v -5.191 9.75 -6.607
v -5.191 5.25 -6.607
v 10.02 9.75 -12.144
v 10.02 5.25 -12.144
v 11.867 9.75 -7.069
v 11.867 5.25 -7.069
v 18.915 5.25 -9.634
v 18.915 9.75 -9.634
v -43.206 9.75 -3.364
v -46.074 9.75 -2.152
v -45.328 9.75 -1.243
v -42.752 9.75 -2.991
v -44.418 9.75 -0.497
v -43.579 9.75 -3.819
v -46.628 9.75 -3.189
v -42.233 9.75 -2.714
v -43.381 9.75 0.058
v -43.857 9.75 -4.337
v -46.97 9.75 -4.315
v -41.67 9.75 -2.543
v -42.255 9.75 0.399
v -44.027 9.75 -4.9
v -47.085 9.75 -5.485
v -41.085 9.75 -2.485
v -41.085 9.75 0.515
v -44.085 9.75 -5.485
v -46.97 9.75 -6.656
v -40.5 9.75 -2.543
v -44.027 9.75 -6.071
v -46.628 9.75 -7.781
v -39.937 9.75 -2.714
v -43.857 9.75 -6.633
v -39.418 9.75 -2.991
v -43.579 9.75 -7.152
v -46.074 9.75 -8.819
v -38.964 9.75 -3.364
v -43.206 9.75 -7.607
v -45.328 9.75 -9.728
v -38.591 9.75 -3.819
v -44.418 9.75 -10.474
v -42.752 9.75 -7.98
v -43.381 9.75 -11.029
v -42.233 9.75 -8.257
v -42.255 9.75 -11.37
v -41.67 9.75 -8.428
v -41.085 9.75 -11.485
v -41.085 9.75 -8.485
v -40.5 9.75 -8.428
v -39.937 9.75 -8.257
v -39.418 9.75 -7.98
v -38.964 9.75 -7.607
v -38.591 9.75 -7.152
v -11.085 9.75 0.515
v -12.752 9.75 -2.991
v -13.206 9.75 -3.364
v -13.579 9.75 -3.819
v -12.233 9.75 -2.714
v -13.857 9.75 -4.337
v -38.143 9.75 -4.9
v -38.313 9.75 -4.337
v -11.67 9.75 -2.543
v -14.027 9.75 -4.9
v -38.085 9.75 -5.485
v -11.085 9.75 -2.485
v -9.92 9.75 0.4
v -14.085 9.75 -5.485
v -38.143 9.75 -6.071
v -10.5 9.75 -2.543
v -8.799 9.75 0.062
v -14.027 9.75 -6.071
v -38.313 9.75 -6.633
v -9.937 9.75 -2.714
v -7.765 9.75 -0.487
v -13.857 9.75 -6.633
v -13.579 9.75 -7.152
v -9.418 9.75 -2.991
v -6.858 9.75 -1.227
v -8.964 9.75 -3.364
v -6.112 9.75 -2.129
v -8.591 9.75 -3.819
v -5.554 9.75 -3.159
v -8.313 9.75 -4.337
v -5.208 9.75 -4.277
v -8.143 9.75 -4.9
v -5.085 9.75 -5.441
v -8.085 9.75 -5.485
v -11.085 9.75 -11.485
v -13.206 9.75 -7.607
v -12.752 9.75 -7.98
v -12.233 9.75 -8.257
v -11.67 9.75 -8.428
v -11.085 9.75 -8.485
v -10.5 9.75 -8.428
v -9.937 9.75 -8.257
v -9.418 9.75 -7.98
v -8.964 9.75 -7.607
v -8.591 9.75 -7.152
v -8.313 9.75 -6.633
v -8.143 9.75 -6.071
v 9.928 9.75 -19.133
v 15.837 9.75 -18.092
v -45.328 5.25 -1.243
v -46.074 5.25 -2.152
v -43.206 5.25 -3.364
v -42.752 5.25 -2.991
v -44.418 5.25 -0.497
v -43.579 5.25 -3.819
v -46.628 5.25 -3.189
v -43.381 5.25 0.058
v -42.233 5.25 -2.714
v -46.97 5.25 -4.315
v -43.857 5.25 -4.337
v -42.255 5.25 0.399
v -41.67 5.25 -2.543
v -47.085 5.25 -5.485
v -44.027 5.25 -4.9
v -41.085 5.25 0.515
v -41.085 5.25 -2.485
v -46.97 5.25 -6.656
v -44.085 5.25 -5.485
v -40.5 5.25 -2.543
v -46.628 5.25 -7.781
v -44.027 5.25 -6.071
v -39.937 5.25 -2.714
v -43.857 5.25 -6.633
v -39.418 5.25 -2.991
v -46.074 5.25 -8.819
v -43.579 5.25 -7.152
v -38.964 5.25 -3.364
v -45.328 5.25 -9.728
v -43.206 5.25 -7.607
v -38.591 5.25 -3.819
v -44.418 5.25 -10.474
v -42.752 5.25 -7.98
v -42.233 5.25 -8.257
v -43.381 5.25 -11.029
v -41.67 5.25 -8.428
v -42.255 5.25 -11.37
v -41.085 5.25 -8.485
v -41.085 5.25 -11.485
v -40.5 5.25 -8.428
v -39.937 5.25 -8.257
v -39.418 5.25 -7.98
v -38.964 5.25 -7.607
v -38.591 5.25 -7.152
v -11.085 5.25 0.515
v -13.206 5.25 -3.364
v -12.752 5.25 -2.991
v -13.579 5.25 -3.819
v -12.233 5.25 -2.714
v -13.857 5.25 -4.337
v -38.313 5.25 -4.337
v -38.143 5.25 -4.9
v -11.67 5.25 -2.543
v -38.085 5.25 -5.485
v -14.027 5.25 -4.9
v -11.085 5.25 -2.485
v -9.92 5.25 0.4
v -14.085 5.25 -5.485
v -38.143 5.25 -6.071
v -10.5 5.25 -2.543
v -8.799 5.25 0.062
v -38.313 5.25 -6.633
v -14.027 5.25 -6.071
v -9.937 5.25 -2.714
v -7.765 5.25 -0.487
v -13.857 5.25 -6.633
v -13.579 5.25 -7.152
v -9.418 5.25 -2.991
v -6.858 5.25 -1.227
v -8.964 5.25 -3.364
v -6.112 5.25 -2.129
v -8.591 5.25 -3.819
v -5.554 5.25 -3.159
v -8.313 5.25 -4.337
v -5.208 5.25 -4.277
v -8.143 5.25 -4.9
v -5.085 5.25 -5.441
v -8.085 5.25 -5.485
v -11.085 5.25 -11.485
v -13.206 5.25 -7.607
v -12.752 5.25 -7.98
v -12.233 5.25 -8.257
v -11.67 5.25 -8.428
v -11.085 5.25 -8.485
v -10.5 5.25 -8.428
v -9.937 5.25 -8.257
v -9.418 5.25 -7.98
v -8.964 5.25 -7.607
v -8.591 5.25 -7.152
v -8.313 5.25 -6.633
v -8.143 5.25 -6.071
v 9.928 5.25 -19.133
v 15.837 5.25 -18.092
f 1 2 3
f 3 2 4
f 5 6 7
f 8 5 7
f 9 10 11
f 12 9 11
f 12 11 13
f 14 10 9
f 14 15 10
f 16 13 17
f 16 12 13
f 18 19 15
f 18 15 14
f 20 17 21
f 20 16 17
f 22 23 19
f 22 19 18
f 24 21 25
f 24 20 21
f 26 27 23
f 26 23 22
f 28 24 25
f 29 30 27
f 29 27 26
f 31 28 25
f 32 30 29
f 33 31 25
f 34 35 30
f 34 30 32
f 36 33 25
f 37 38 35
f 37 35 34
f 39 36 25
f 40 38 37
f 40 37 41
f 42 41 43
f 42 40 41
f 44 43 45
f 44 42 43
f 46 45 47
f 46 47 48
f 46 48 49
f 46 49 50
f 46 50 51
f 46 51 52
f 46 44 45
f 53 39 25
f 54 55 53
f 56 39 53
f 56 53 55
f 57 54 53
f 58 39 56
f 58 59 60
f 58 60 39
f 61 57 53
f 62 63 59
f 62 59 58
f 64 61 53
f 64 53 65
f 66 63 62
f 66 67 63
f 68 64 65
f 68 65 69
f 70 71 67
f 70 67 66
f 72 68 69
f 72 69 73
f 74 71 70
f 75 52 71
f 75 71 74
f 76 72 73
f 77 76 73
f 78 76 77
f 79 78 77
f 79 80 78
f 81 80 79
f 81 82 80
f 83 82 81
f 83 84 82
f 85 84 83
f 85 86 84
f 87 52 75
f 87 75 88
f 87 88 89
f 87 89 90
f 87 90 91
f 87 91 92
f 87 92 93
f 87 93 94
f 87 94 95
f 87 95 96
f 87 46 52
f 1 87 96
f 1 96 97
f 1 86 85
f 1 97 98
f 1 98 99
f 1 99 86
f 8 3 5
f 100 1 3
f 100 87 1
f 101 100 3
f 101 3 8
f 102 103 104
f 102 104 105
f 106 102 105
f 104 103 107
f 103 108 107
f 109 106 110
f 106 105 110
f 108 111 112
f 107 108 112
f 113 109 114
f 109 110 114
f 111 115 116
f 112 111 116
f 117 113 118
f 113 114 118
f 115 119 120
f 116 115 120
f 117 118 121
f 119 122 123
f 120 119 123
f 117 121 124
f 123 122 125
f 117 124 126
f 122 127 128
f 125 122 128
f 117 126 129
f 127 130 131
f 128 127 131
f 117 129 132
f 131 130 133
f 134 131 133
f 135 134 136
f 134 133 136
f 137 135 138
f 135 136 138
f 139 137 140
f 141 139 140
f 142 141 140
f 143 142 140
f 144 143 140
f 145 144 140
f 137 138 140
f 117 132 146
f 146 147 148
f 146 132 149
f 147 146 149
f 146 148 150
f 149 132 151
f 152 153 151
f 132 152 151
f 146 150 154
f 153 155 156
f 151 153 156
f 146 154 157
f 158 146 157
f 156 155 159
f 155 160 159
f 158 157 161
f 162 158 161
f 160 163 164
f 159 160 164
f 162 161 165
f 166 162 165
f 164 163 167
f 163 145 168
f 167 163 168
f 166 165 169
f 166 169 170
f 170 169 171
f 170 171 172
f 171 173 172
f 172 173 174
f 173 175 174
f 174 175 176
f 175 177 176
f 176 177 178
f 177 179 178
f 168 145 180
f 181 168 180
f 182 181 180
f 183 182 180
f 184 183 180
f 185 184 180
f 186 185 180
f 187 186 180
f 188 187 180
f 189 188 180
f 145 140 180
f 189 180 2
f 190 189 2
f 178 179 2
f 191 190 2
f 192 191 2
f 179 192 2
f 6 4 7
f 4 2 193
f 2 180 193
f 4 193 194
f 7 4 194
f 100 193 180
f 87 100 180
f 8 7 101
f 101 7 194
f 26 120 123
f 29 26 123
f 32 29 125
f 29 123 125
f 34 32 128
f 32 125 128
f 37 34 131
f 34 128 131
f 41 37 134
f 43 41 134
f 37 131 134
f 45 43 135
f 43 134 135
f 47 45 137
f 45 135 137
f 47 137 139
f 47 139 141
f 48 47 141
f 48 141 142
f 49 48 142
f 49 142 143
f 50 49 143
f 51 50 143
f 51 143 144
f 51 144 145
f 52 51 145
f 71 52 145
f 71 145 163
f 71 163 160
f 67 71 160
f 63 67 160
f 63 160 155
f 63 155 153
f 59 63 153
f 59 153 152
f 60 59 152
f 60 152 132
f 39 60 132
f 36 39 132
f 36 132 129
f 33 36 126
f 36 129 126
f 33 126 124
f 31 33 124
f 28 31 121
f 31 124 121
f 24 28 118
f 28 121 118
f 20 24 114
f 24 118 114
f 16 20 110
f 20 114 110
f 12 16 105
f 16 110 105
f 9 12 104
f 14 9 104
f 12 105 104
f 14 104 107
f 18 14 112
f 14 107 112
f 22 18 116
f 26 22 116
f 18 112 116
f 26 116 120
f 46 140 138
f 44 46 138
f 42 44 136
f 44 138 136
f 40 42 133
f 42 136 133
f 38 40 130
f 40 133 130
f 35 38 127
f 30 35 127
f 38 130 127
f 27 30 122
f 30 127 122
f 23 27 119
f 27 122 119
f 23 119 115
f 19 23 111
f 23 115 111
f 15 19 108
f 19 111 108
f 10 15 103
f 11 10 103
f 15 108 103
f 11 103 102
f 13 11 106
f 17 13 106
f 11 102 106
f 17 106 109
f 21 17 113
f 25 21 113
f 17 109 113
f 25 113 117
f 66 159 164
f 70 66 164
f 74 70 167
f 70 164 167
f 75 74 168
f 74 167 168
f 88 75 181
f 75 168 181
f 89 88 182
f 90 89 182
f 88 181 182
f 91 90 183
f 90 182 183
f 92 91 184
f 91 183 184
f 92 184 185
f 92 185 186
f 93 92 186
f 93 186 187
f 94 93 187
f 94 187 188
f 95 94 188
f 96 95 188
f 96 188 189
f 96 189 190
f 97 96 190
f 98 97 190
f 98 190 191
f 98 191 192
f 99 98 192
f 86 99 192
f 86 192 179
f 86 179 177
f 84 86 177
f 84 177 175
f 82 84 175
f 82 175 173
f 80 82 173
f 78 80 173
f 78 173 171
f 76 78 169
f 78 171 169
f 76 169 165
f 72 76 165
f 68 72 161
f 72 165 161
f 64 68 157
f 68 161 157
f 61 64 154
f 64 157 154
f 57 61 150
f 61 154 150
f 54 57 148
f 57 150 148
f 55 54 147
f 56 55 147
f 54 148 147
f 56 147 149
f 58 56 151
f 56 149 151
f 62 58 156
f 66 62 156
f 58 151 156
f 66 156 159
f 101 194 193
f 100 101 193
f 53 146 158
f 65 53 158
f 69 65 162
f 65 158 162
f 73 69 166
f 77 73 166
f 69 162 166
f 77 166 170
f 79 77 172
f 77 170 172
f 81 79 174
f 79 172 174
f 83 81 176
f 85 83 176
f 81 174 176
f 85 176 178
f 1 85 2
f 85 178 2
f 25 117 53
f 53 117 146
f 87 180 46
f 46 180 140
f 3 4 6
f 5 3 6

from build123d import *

# Parameters (mm, degrees)
BOSS_EXTRUDE1_DEPTH = 15
F_20_0MM_1_D        = 20
SCALE_1_SCALE       = 0.3


with BuildPart() as part:
    # Sketch1 → Boss-Extrude1 (new body)
    with BuildSketch(Plane(origin=(0, 0, 0), x_dir=(1, 0, 0), z_dir=(0, 1, 0))):
        with BuildLine():
            Line((0, 20), (-100, 20))
            ThreePointArc((-100, 20), (-120, 0), (-100, -20))
            Line((-100, -20), (0, -20))
            ThreePointArc((0, -20), (20, 0), (0, 20))
        make_face()
        with BuildLine():
            ThreePointArc((0, 20), (12.75180627, 15.407512352), (19.64736126, 3.739143686))
            Line((19.64736126, 3.739143686), (70.3513219, 22.193876119))
            Line((70.3513219, 22.193876119), (76.50768448, 5.279408944))
            Line((76.50768448, 5.279408944), (100, 13.829912528))
            Line((100, 13.829912528), (89.7393957, 42.020691151))
            Line((89.7393957, 42.020691151), (70.04324064, 45.493654704))
            Line((70.04324064, 45.493654704), (0, 20))
        make_face()
    extrude(amount=BOSS_EXTRUDE1_DEPTH)

    # Ø20.0mm 맞춤핀 구멍1 (through all)
    with Locations(Plane(origin=(0, 15, 0), x_dir=(1, 0, 0), z_dir=(0, 1, 0))):
        with Locations((-100, 0), (0, 0)):
            Hole(F_20_0MM_1_D / 2)


with BuildPart() as part_1:
    # 축척1: scaled about (-15.835607979, 7.5, -7.836280523)
    add(part.part.scale(SCALE_1_SCALE).moved(Location((-11.084925585, 5.25, -5.485396366))))


solid = part_1.part
